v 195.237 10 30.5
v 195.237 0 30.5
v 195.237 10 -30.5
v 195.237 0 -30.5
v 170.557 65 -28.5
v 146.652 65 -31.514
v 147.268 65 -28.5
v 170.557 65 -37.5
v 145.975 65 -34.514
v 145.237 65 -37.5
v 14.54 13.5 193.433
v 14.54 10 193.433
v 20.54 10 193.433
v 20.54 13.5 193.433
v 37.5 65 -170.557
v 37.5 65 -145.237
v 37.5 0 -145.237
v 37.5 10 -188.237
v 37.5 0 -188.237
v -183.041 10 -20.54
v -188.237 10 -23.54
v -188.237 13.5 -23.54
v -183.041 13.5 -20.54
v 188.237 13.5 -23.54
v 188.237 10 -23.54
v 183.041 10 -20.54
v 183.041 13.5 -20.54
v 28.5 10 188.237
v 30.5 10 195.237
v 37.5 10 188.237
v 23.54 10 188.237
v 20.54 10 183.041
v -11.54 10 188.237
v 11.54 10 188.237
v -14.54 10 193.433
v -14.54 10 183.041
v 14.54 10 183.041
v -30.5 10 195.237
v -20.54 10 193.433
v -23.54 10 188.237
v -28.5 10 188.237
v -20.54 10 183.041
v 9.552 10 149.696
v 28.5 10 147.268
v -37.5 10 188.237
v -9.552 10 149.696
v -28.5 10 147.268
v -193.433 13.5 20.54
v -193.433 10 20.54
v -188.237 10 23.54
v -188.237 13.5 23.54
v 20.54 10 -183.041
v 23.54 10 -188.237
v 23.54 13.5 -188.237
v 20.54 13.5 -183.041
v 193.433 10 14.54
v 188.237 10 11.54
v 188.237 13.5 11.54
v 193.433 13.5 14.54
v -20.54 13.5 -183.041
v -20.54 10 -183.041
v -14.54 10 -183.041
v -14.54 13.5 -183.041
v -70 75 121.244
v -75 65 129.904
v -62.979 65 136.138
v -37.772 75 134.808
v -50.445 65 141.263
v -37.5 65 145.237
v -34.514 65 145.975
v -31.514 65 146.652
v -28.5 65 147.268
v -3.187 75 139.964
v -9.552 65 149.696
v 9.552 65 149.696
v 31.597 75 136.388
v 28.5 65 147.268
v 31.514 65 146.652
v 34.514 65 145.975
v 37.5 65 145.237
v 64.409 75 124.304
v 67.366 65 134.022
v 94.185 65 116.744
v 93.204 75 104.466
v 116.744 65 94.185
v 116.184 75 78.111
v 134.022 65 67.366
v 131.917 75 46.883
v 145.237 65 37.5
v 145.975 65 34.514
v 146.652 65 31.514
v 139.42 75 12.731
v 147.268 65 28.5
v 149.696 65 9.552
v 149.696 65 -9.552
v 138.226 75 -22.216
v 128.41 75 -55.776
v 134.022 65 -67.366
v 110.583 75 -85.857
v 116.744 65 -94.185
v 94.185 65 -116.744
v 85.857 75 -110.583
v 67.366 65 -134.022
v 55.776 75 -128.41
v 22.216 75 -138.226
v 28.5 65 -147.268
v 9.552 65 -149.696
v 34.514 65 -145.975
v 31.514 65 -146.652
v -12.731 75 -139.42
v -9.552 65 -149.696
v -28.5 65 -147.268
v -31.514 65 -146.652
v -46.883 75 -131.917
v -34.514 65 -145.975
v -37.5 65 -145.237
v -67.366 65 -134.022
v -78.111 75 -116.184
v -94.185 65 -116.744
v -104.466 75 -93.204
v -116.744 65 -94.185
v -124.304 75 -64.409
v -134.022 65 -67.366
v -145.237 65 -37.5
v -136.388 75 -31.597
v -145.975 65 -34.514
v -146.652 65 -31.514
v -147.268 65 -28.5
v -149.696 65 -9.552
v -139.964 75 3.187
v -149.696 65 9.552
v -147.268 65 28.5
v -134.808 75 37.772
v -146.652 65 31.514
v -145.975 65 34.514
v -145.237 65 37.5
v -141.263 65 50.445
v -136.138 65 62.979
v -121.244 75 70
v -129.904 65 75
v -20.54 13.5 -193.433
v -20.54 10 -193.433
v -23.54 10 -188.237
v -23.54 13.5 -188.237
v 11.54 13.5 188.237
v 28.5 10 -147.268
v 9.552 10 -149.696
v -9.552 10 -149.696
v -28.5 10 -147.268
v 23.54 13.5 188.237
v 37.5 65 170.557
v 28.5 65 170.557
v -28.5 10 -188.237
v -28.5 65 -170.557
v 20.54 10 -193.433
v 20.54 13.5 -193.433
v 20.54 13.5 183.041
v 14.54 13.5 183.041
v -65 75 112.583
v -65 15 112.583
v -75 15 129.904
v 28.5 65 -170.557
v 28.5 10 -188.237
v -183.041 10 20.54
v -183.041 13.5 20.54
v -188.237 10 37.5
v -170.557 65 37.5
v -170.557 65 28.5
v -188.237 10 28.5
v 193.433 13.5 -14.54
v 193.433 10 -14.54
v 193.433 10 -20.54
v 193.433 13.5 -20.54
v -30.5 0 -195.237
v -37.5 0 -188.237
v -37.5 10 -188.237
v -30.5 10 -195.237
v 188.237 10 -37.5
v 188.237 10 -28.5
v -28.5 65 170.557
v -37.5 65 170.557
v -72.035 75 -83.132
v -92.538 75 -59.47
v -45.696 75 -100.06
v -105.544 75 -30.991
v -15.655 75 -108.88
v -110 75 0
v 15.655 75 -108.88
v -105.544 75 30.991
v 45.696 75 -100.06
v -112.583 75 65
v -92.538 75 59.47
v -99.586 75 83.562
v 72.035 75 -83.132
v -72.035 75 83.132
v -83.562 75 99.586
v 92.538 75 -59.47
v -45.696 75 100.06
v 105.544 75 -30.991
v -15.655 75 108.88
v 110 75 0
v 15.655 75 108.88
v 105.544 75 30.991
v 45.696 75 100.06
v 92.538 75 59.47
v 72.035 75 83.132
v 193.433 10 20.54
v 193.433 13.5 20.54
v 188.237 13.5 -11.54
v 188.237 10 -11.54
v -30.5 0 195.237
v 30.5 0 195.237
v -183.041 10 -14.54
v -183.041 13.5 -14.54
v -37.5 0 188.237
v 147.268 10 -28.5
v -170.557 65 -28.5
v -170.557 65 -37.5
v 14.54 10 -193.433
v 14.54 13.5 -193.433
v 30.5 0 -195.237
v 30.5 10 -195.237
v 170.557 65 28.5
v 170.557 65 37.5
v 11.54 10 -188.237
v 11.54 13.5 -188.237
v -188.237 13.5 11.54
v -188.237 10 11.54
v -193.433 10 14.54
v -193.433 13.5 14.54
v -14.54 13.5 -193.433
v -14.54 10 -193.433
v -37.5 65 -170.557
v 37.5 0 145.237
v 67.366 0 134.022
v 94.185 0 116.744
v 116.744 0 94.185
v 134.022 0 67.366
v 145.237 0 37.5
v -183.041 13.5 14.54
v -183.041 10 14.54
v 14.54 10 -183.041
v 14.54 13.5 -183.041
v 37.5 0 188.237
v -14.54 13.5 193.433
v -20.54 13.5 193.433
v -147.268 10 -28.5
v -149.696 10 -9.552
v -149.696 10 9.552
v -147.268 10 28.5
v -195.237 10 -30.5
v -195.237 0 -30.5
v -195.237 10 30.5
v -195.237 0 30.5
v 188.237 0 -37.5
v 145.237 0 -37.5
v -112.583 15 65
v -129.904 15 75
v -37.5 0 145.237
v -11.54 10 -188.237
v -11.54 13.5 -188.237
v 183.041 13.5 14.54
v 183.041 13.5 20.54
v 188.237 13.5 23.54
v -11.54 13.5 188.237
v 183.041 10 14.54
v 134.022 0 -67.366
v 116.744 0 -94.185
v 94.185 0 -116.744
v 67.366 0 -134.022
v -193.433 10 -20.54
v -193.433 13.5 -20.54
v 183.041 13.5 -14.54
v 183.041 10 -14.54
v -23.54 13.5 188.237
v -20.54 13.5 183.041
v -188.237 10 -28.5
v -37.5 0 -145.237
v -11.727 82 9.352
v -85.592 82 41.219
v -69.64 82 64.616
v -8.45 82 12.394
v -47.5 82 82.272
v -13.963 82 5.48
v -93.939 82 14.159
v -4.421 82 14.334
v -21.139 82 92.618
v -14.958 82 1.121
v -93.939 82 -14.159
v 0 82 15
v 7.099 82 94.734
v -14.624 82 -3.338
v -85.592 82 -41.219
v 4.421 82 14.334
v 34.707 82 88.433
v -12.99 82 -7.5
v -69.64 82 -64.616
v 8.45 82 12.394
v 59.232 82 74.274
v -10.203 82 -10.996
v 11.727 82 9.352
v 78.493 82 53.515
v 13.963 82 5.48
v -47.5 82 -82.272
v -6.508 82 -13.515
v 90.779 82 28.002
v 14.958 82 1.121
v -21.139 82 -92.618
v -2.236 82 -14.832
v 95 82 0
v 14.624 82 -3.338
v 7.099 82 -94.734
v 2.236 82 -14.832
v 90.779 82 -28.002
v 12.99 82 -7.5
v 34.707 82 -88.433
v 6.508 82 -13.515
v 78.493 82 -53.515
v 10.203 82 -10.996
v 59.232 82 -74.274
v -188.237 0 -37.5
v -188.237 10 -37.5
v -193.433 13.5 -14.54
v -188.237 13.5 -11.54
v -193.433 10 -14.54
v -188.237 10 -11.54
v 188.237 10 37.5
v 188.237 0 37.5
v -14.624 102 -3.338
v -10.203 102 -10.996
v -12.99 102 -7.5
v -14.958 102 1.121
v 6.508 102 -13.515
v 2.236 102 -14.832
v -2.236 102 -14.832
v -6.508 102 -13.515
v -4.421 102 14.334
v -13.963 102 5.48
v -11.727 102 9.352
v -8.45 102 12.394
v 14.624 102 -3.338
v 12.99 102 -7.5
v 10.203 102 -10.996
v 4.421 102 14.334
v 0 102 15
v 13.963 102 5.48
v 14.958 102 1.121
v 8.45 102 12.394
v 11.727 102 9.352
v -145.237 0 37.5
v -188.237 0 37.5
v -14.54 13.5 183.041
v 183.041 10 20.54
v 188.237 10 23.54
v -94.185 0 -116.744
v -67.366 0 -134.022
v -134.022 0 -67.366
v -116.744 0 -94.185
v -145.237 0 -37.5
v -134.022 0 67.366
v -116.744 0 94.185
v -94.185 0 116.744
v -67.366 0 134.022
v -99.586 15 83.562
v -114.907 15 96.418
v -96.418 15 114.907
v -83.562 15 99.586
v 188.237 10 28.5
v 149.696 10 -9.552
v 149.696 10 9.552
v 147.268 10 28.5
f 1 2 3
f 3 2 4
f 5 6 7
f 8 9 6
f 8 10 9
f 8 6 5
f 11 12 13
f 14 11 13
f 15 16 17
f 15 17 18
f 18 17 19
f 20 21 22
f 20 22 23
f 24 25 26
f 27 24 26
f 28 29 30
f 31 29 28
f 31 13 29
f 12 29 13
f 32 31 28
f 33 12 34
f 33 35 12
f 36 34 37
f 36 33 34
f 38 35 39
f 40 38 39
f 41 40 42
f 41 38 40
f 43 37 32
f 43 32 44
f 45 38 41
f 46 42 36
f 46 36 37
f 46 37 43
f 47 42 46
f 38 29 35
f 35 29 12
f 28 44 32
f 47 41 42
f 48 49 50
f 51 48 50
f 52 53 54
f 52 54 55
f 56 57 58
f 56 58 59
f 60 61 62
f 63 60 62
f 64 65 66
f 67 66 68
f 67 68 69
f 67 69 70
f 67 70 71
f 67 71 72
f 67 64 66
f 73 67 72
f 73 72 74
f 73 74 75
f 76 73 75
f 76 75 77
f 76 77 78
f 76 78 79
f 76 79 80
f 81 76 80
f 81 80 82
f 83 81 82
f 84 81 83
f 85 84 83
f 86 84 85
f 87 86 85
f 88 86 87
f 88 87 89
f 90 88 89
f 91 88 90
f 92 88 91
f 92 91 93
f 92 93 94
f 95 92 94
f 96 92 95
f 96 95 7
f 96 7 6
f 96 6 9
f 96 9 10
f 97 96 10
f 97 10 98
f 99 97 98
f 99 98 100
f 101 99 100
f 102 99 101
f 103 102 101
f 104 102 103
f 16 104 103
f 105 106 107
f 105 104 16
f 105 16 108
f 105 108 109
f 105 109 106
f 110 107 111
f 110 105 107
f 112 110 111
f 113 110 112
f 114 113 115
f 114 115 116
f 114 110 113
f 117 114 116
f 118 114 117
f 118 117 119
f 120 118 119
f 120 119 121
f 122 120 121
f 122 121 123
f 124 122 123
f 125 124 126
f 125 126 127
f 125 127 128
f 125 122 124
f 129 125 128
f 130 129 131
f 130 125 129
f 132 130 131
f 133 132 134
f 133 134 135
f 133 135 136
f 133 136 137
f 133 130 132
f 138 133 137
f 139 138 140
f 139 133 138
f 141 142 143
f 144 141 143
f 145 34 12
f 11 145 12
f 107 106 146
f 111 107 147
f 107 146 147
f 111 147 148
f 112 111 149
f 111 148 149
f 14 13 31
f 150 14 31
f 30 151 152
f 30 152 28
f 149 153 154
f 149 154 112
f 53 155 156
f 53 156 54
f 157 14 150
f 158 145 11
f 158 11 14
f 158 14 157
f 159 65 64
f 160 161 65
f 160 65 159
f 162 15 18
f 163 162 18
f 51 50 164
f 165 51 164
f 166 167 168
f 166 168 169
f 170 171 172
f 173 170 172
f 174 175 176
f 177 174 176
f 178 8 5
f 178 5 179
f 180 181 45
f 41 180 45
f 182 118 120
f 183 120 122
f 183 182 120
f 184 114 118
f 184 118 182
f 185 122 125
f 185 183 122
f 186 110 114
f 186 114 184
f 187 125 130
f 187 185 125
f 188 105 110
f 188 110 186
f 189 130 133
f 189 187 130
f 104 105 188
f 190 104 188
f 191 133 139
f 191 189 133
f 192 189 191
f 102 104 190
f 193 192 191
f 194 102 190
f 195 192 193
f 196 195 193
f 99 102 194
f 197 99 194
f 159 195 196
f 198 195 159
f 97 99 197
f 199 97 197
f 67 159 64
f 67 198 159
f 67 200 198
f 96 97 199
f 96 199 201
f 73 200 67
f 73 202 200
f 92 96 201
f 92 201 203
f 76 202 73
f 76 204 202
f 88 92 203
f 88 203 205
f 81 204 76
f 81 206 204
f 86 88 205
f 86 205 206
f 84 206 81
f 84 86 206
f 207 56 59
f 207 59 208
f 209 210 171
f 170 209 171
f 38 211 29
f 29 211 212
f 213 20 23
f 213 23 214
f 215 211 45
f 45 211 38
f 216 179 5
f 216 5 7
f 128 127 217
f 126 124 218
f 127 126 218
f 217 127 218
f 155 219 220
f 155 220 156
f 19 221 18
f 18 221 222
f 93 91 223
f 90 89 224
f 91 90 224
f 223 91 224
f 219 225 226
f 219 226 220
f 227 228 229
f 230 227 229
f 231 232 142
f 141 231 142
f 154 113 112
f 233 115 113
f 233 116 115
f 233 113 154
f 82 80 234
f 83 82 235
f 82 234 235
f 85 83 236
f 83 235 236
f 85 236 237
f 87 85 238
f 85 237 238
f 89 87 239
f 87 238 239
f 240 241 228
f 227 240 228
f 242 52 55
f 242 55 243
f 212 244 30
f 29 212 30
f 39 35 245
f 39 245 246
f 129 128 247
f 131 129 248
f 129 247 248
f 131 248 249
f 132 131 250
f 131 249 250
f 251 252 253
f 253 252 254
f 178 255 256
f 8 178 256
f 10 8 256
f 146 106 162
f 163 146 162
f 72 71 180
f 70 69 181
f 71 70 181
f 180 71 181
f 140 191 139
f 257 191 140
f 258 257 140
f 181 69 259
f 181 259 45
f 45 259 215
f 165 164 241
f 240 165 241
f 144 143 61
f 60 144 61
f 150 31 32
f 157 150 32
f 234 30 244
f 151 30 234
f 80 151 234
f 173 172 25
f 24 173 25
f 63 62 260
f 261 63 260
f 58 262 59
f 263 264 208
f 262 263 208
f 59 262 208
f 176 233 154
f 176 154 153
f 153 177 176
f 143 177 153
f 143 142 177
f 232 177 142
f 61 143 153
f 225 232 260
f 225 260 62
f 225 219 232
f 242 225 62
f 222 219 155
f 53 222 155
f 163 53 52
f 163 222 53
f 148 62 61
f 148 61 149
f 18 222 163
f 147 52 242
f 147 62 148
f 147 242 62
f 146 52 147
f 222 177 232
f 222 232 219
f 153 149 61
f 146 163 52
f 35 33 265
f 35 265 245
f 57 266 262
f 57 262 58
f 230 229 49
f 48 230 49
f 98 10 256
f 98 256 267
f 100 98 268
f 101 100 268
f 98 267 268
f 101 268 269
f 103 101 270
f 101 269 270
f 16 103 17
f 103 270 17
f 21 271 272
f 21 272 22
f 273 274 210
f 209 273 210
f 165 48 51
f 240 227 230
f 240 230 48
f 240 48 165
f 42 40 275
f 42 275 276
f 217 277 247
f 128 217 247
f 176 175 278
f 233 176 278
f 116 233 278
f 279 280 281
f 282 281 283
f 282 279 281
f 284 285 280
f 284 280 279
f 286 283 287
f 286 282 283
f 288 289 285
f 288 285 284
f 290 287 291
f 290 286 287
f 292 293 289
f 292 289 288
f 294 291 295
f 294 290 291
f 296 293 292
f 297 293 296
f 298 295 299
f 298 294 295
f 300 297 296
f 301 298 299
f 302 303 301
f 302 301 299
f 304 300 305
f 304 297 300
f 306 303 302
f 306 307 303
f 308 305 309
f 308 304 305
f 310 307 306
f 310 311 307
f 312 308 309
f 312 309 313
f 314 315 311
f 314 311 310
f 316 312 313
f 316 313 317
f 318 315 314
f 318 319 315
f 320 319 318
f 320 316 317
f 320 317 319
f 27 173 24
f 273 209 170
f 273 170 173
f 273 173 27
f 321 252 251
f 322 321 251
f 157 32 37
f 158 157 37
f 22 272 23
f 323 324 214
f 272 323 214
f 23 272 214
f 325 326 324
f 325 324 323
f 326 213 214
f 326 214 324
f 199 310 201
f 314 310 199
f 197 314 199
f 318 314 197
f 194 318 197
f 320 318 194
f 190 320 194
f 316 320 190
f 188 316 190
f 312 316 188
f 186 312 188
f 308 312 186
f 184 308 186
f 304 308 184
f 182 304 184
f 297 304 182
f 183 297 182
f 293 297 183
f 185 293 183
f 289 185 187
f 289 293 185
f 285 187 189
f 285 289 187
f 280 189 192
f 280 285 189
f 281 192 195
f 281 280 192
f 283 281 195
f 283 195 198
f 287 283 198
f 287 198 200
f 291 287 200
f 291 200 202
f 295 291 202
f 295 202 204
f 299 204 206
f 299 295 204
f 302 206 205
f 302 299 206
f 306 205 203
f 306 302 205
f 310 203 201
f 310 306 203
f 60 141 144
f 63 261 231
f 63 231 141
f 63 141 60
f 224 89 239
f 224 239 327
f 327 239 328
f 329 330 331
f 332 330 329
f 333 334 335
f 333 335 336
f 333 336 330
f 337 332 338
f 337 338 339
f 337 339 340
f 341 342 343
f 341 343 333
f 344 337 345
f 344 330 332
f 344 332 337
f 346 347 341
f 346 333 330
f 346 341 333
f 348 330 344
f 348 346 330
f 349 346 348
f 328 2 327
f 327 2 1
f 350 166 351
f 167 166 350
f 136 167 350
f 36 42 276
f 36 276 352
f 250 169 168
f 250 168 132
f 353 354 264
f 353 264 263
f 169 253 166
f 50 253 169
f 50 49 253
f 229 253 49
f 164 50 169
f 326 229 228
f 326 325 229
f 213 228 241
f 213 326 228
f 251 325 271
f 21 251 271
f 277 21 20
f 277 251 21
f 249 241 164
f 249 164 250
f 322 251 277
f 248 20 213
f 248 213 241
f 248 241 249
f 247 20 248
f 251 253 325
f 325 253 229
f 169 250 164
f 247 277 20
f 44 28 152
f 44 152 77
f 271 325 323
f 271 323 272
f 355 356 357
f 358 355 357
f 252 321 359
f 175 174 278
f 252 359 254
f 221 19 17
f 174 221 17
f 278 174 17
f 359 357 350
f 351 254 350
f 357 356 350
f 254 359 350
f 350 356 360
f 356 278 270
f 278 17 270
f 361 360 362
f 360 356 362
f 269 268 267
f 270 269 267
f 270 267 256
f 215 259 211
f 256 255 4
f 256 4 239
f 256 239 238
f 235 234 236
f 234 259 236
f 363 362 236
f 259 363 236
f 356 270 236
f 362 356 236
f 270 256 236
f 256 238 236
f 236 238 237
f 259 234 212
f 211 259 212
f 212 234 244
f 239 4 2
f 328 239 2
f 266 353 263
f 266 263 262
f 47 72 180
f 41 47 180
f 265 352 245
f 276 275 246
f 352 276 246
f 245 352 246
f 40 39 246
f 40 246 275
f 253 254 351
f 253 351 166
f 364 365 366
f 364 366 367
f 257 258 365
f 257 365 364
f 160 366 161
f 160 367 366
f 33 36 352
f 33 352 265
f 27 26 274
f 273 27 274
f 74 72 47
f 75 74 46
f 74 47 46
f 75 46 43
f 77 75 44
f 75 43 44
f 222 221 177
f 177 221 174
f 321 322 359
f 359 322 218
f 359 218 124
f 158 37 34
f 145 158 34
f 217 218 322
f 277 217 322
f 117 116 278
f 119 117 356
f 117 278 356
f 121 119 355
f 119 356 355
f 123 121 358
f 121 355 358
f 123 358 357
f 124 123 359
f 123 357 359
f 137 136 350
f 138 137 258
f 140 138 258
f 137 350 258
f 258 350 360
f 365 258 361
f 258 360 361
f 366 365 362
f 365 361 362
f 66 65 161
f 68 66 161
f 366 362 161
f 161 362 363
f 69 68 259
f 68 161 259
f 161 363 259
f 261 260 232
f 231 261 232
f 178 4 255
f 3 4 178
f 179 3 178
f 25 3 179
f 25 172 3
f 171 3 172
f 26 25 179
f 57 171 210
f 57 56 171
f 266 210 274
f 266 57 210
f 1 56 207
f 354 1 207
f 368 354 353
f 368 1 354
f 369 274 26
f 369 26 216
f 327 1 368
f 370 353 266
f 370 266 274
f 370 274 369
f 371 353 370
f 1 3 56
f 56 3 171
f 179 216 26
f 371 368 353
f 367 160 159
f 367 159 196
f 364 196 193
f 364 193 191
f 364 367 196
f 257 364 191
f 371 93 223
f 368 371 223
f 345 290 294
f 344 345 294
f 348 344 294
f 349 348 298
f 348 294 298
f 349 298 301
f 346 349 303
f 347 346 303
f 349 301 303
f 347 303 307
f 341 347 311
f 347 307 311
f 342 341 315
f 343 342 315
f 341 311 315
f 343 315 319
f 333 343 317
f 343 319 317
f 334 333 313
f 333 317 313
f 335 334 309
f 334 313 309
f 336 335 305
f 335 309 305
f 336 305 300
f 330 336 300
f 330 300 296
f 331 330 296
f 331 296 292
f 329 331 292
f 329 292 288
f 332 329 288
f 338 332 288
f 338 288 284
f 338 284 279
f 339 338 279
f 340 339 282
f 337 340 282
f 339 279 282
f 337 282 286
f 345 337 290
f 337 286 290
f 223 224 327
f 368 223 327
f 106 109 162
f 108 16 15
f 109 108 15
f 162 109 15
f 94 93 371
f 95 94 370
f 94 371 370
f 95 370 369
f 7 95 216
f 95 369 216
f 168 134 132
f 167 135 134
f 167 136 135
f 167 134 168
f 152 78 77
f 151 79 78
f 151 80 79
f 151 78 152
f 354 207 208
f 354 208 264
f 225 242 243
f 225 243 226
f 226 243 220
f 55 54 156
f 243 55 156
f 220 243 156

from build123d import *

# Parameters (mm, degrees)
SKETCH1_R                    = 150
BOSS_EXTRUDE1_DEPTH          = 75
CHAMFER1_SIZE                = 10
BOSS_EXTRUDE2_DEPTH          = 10
CHAMFER2_SIZE                = 7
BOSS_EXTRUDE3_DEPTH          = 9
BOSS_EXTRUDE4_DEPTH          = 3.5
CIRPATTERN1_COUNT            = 4
CIRPATTERN1_COPY_1_DEPTH     = 9
CIRPATTERN1_COPY_2_DEPTH     = 9
CIRPATTERN1_COPY_3_DEPTH     = 9
CIRPATTERN1_COPY_4_DEPTH     = 3.5
CIRPATTERN1_COPY_5_DEPTH     = 3.5
CIRPATTERN1_COPY_6_DEPTH     = 3.5
CHAMFER2_OF_CIRPATTERN1_SIZE = 7
CUT_EXTRUDE1_START           = -60
CUT_EXTRUDE1_DEPTH           = 60
SKETCH7_R                    = 110
SKETCH8_R                    = 95
SKETCH9_R                    = 15
BOSS_EXTRUDE5_DEPTH          = 20


with BuildPart() as part:
    # Sketch1 → Boss-Extrude1 (new body)
    with BuildSketch(Plane(origin=(0, 0, 0), x_dir=(1, 0, 0), z_dir=(0, 1, 0))):
        with Locations(Location((0, 0, 0), (0, 0, 270))):
            Circle(SKETCH1_R)
    extrude(amount=BOSS_EXTRUDE1_DEPTH)

    # Chamfer1
    chamfer1_edges = [part.edges().sort_by_distance(p)[0] for p in [
        (0, 75, -150),
    ]]
    chamfer(chamfer1_edges, length=CHAMFER1_SIZE)

    # Sketch2 → Boss-Extrude2 (add)
    with BuildSketch(Plane(origin=(0, 0, 0), x_dir=(-1, 0, 0), z_dir=(0, -1, 0))):
        with BuildLine():
            Line((145.236875483, 37.5), (195.236875483, 37.5))
            Line((195.236875483, 37.5), (195.236875483, -37.5))
            Line((195.236875483, -37.5), (145.236875483, -37.5))
            ThreePointArc((145.236875483, -37.5), (150, 0), (145.236875483, 37.5))
        make_face()
    boss_extrude2 = extrude(amount=-BOSS_EXTRUDE2_DEPTH)

    # Chamfer2
    chamfer2_edges = [part.edges().sort_by_distance(p)[0] for p in [
        (-195.236875483, 5, -37.5),
        (-195.236875483, 5, 37.5),
    ]]
    chamfer(chamfer2_edges, length=CHAMFER2_SIZE)

    # Sketch3 → Boss-Extrude3 (add)
    with BuildSketch(Plane.XY.offset(37.5)):
        Polygon((-145.236875483, 10), (-145.236875483, 65), (-170.556875483, 65), (-188.236875483, 10), align=None)
    boss_extrude3 = extrude(amount=-BOSS_EXTRUDE3_DEPTH)

    # Sketch4 → Boss-Extrude4 (add)
    with BuildSketch(Plane(origin=(0, 10, 0), x_dir=(1, 0, 0), z_dir=(0, 1, 0))):
        Polygon((-188.236875483, -23.54), (-183.04072306, -20.54), (-183.04072306, -14.54), (-188.236875483, -11.54), (-193.433027905, -14.54), (-193.433027905, -20.54), align=None)
    boss_extrude4 = extrude(amount=BOSS_EXTRUDE4_DEPTH)

    # Mirror1: Boss-Extrude3, Boss-Extrude4 across plane
    add(boss_extrude3.mirror(Plane.XY))
    add(boss_extrude4.mirror(Plane.XY))

    # CirPattern1: Boss-Extrude2, Boss-Extrude3, Boss-Extrude4 ×4 about axis
    cirpattern1_axis = Axis((0, 0, 0), (0, 1, 0))
    add([boss_extrude2.rotate(cirpattern1_axis, i * 360 / CIRPATTERN1_COUNT) for i in range(1, CIRPATTERN1_COUNT)])
    add([boss_extrude3.rotate(cirpattern1_axis, i * 360 / CIRPATTERN1_COUNT) for i in range(1, CIRPATTERN1_COUNT)])
    add([boss_extrude4.rotate(cirpattern1_axis, i * 360 / CIRPATTERN1_COUNT) for i in range(1, CIRPATTERN1_COUNT)])

    # CirPattern1 copy 1 sketch → CirPattern1 copy 1 (add)
    with BuildSketch(Plane(origin=(-37.5, 0, 0), x_dir=(0, 0, -1), z_dir=(-1, 0, 0))):
        Polygon((-145.236875483, -10), (-145.236875483, -65), (-170.556875483, -65), (-188.236875483, -10), align=None)
    extrude(amount=-CIRPATTERN1_COPY_1_DEPTH)

    # CirPattern1 copy 2 sketch → CirPattern1 copy 2 (add)
    with BuildSketch(Plane(origin=(0, 0, 37.5), x_dir=(-1, 0, 0), z_dir=(0, 0, 1))):
        Polygon((-145.236875483, -10), (-145.236875483, -65), (-170.556875483, -65), (-188.236875483, -10), align=None)
    extrude(amount=-CIRPATTERN1_COPY_2_DEPTH)

    # CirPattern1 copy 3 sketch → CirPattern1 copy 3 (add)
    with BuildSketch(Plane(origin=(37.5, 0, 0), x_dir=(0, 0, 1), z_dir=(1, 0, 0))):
        Polygon((-145.236875483, -10), (-145.236875483, -65), (-170.556875483, -65), (-188.236875483, -10), align=None)
    extrude(amount=-CIRPATTERN1_COPY_3_DEPTH)

    # CirPattern1 copy 4 sketch → CirPattern1 copy 4 (add)
    with BuildSketch(Plane(origin=(0, 10, 0), x_dir=(0, 0, -1), z_dir=(0, 1, 0))):
        Polygon((-188.236875483, 23.54), (-183.04072306, 20.54), (-183.04072306, 14.54), (-188.236875483, 11.54), (-193.433027905, 14.54), (-193.433027905, 20.54), align=None)
    extrude(amount=CIRPATTERN1_COPY_4_DEPTH)

    # CirPattern1 copy 5 sketch → CirPattern1 copy 5 (add)
    with BuildSketch(Plane(origin=(0, 10, 0), x_dir=(-1, 0, 0), z_dir=(0, 1, 0))):
        Polygon((-188.236875483, 23.54), (-183.04072306, 20.54), (-183.04072306, 14.54), (-188.236875483, 11.54), (-193.433027905, 14.54), (-193.433027905, 20.54), align=None)
    extrude(amount=CIRPATTERN1_COPY_5_DEPTH)

    # CirPattern1 copy 6 sketch → CirPattern1 copy 6 (add)
    with BuildSketch(Plane.ZX.offset(10)):
        Polygon((-188.236875483, 23.54), (-183.04072306, 20.54), (-183.04072306, 14.54), (-188.236875483, 11.54), (-193.433027905, 14.54), (-193.433027905, 20.54), align=None)
    extrude(amount=CIRPATTERN1_COPY_6_DEPTH)

    # Chamfer2 of CirPattern1
    chamfer2_of_cirpattern1_edges = [part.edges().sort_by_distance(p)[0] for p in [
        (-37.5, 5, 195.236875483),
        (37.5, 5, 195.236875483),
        (195.236875483, 5, 37.5),
        (195.236875483, 5, -37.5),
        (37.5, 5, -195.236875483),
        (-37.5, 5, -195.236875483),
    ]]
    chamfer(chamfer2_of_cirpattern1_edges, length=CHAMFER2_OF_CIRPATTERN1_SIZE)

    # Sketch6 → Cut-Extrude1 (cut)
    with BuildSketch(Plane(origin=(0, 75, 0), x_dir=(1, 0, 0), z_dir=(0, 1, 0)).offset(CUT_EXTRUDE1_START)):
        with BuildLine():
            Line((-112.583302492, -65), (-129.903810568, -75))
            ThreePointArc((-129.903810568, -75), (-106.066017178, -106.066017178), (-75, -129.903810568))
            Line((-75, -129.903810568), (-65, -112.583302492))
            ThreePointArc((-65, -112.583302492), (-91.923881554, -91.923881554), (-112.583302492, -65))
        make_face()
    extrude(amount=CUT_EXTRUDE1_DEPTH, mode=Mode.SUBTRACT)

    # Sketch7 → Loft1 section 0
    with BuildSketch(Plane(origin=(0, 75, 0), x_dir=(1, 0, 0), z_dir=(0, 1, 0))):
        Circle(SKETCH7_R)
    # Sketch8 → Loft1 section 1
    with BuildSketch(Plane(origin=(0, 82, 0), x_dir=(1, 0, 0), z_dir=(0, 1, 0))):
        Circle(SKETCH8_R)
    loft()

    # Sketch9 → Boss-Extrude5 (add)
    with BuildSketch(Plane(origin=(0, 82, 0), x_dir=(1, 0, 0), z_dir=(0, 1, 0))):
        with Locations(Location((0, 0, 0), (0, 0, 270))):
            Circle(SKETCH9_R)
    extrude(amount=BOSS_EXTRUDE5_DEPTH)


solid = part.part
